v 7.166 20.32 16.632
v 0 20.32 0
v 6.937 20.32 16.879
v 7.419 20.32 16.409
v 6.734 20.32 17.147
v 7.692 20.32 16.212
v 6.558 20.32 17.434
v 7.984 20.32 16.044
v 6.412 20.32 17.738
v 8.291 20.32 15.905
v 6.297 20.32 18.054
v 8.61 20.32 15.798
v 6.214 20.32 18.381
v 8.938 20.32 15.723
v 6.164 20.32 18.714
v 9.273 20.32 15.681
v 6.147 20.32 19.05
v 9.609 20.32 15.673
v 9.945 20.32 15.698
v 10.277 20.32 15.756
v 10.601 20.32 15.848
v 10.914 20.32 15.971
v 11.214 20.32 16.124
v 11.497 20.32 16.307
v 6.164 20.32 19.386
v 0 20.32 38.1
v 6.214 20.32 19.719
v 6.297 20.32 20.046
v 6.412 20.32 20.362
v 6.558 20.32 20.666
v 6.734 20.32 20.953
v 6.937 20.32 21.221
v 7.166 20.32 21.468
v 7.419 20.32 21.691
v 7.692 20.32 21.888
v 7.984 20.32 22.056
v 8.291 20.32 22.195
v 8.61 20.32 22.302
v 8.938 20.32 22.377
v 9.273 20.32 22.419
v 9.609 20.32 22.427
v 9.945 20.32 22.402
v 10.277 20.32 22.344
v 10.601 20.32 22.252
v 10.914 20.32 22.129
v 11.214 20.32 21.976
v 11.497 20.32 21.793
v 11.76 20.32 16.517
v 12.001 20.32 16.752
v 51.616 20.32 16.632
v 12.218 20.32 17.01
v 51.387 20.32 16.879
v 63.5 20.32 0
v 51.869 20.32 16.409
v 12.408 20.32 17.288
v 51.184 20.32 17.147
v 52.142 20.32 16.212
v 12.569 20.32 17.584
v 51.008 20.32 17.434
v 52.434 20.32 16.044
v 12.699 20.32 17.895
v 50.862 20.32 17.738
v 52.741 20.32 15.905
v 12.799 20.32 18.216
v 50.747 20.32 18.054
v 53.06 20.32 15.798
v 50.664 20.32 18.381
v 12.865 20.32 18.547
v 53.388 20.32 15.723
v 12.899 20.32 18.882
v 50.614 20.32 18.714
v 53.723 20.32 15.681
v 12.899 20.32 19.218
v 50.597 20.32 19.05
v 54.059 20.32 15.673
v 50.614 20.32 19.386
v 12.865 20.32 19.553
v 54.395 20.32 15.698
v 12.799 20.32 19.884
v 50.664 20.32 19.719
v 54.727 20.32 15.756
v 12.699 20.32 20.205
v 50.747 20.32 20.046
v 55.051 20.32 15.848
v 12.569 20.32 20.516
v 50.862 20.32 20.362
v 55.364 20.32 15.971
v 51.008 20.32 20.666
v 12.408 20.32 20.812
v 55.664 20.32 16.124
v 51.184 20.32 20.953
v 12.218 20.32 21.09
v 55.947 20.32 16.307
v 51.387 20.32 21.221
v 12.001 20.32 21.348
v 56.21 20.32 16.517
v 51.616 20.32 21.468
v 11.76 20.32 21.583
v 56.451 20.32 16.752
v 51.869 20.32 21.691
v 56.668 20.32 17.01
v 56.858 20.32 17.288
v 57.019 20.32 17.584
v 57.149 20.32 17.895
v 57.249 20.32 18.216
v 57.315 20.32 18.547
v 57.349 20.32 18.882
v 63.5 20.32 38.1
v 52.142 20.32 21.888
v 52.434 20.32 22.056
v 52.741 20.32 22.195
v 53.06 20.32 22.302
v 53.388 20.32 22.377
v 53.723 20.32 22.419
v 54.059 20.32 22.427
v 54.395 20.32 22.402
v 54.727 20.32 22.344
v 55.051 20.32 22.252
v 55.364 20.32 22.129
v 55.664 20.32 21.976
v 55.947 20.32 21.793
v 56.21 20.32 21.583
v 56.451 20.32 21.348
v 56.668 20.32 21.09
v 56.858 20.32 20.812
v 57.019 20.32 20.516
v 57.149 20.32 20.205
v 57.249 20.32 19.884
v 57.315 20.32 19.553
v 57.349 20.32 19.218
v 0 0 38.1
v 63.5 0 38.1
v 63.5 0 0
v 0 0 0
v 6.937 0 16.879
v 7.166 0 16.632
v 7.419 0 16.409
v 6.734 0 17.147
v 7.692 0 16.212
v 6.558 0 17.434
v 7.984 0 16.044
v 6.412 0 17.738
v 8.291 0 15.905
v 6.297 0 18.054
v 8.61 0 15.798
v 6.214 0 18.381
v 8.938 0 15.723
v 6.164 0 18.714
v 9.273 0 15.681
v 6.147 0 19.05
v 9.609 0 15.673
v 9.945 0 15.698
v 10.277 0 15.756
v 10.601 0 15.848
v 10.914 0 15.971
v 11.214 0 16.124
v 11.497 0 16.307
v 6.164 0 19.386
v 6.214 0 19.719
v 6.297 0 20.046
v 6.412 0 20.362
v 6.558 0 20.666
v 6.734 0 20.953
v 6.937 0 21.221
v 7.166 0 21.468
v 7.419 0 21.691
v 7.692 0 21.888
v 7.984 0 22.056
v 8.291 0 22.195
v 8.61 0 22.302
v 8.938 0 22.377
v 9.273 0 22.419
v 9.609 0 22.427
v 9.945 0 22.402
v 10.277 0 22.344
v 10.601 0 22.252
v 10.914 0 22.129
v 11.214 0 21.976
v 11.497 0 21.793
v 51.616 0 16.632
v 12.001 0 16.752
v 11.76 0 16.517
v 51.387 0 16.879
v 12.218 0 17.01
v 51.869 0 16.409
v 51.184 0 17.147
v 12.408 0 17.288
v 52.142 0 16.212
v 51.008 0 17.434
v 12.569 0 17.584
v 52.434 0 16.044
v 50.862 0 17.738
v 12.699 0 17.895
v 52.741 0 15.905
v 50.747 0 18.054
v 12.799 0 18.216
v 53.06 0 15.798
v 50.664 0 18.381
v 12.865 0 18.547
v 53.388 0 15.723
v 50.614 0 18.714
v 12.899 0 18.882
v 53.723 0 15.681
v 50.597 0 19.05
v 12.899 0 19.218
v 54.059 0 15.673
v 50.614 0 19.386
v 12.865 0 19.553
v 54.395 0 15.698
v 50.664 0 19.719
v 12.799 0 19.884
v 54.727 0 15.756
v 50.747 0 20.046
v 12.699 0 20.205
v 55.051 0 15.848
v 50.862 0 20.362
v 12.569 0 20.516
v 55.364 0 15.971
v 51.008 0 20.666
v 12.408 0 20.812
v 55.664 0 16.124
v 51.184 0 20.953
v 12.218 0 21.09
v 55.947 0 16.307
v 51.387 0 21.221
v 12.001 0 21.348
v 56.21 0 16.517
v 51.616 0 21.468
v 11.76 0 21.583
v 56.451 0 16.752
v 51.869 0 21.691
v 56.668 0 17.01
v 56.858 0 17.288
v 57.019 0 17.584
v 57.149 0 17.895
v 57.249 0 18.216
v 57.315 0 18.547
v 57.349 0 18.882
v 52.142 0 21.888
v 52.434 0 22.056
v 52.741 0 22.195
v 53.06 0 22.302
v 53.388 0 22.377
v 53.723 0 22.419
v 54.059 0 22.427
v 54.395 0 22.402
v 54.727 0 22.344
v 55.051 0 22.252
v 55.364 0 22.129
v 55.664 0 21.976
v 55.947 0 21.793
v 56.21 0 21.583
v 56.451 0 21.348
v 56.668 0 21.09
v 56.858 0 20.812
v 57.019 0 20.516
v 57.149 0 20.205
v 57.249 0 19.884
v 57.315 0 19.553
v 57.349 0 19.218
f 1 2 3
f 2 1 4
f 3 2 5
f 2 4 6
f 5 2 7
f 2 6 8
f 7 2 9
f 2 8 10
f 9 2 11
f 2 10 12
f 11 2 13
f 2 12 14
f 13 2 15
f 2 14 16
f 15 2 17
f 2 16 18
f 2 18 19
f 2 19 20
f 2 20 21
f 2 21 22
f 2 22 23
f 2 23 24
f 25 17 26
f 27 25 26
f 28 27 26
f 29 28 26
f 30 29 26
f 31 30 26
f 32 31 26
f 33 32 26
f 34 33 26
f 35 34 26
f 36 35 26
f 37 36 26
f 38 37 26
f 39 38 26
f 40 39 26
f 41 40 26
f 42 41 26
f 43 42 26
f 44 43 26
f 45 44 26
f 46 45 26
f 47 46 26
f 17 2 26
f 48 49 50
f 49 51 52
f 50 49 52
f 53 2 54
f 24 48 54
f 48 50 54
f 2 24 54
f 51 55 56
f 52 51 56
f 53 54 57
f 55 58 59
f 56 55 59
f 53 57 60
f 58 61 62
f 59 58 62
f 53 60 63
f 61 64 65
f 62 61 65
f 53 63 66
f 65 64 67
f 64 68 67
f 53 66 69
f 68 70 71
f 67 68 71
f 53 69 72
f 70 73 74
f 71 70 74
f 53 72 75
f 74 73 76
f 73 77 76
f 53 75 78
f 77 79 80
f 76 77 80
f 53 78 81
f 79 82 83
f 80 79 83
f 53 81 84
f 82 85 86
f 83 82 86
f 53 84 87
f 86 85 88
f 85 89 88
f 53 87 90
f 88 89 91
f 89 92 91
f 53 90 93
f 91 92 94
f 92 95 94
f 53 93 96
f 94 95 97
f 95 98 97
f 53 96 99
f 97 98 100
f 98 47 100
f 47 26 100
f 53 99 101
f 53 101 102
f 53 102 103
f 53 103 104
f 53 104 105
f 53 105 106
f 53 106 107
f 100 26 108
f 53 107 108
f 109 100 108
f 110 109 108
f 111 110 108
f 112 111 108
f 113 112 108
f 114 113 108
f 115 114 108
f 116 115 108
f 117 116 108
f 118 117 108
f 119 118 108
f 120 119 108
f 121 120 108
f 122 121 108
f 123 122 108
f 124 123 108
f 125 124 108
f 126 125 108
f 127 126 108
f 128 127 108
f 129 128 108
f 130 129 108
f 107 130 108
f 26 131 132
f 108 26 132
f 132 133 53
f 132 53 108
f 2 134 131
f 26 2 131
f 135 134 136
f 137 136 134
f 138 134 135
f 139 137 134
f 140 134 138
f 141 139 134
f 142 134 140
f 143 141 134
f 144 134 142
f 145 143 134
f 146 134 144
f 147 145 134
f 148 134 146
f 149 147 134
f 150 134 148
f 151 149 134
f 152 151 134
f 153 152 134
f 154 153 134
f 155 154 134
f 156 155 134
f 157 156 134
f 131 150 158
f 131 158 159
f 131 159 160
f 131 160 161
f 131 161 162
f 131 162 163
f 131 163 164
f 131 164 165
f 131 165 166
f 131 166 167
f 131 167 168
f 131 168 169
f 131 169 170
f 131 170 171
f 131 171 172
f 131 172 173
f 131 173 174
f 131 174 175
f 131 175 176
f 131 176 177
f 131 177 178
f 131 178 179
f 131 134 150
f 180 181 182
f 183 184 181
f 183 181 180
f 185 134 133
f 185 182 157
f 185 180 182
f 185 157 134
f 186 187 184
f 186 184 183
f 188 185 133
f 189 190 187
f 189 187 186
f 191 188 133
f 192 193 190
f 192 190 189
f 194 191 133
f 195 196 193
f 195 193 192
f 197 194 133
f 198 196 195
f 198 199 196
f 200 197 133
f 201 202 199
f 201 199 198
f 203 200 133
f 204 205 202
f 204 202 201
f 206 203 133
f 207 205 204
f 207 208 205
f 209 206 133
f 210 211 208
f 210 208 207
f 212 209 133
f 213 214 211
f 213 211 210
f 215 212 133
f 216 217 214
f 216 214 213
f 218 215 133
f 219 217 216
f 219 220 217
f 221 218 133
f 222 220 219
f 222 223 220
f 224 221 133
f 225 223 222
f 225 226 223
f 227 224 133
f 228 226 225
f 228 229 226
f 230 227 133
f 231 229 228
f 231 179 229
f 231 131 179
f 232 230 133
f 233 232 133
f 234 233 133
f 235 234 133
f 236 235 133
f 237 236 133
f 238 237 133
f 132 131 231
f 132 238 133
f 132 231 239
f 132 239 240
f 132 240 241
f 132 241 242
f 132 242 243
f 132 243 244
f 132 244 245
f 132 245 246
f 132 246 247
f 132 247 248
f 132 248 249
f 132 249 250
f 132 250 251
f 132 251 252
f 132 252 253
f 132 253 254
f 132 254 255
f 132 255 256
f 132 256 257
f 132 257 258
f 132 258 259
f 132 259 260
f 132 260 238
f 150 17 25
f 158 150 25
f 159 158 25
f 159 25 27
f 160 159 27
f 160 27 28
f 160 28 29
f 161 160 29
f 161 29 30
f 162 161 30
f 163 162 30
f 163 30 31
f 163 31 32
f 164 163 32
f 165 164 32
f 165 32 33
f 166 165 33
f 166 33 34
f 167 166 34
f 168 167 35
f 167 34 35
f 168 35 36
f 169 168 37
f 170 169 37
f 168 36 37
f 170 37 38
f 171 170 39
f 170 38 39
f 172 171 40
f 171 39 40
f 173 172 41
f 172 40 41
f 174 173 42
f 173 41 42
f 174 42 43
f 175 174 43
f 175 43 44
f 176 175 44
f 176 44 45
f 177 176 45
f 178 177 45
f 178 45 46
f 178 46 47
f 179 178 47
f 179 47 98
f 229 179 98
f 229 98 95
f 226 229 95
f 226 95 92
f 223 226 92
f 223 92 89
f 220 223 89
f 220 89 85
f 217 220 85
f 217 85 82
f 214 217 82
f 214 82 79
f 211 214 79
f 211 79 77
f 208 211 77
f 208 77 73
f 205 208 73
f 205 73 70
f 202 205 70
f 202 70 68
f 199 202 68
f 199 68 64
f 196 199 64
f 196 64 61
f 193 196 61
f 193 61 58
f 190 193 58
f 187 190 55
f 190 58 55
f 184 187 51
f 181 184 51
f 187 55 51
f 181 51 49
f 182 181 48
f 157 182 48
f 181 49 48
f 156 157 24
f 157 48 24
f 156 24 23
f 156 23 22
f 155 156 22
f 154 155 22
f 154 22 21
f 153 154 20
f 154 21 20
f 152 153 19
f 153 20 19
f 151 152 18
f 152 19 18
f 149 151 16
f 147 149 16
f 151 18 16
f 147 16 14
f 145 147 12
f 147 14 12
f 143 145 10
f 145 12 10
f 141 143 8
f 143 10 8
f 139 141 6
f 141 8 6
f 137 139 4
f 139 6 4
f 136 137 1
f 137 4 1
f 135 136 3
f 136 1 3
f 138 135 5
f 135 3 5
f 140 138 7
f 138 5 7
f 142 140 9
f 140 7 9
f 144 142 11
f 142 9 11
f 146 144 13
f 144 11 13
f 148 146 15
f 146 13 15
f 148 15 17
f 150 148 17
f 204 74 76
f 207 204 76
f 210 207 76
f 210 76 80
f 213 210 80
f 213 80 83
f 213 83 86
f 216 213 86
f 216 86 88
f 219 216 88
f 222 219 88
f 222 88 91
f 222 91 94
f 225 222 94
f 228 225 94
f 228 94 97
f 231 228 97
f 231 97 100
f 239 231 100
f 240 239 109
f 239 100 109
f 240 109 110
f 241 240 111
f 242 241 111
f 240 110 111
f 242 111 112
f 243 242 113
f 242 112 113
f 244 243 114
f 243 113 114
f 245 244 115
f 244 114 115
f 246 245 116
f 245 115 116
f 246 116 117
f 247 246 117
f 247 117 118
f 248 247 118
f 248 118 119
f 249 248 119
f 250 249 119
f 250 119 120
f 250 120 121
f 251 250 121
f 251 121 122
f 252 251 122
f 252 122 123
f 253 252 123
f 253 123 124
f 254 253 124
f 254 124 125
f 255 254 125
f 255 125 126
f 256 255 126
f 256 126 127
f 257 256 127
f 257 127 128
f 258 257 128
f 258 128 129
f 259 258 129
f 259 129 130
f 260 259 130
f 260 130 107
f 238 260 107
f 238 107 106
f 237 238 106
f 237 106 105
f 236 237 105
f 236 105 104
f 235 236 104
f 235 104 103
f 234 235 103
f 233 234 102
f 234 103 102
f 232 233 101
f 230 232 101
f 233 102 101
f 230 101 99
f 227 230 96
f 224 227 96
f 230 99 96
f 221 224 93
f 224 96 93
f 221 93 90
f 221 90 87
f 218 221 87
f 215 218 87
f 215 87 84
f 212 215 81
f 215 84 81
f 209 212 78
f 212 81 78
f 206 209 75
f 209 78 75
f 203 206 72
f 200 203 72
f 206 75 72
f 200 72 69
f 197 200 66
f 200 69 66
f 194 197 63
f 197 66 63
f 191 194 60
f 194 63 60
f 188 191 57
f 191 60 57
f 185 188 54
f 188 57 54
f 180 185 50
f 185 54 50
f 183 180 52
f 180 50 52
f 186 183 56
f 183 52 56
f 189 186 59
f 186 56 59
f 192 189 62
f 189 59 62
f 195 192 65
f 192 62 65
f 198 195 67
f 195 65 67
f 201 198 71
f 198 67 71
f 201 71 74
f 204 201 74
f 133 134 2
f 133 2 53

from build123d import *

# Parameters (mm, degrees)
F0_W     = 63.5
F0_H     = 38.1
F1_DEPTH = 20.32
F3_D     = 6.7564


with BuildPart() as f1:
    # F0 (on Front) → F1 (new body)
    with BuildSketch(Plane.XZ):
        with Locations((31.75, 19.05)):
            Rectangle(F0_W, F0_H)
    extrude(amount=-F1_DEPTH)

    # F3 (through all)
    with Locations(Plane.XZ):
        with Locations((9.525, 19.05), (53.975, 19.05)):
            Hole(F3_D / 2)


solid = f1.part
